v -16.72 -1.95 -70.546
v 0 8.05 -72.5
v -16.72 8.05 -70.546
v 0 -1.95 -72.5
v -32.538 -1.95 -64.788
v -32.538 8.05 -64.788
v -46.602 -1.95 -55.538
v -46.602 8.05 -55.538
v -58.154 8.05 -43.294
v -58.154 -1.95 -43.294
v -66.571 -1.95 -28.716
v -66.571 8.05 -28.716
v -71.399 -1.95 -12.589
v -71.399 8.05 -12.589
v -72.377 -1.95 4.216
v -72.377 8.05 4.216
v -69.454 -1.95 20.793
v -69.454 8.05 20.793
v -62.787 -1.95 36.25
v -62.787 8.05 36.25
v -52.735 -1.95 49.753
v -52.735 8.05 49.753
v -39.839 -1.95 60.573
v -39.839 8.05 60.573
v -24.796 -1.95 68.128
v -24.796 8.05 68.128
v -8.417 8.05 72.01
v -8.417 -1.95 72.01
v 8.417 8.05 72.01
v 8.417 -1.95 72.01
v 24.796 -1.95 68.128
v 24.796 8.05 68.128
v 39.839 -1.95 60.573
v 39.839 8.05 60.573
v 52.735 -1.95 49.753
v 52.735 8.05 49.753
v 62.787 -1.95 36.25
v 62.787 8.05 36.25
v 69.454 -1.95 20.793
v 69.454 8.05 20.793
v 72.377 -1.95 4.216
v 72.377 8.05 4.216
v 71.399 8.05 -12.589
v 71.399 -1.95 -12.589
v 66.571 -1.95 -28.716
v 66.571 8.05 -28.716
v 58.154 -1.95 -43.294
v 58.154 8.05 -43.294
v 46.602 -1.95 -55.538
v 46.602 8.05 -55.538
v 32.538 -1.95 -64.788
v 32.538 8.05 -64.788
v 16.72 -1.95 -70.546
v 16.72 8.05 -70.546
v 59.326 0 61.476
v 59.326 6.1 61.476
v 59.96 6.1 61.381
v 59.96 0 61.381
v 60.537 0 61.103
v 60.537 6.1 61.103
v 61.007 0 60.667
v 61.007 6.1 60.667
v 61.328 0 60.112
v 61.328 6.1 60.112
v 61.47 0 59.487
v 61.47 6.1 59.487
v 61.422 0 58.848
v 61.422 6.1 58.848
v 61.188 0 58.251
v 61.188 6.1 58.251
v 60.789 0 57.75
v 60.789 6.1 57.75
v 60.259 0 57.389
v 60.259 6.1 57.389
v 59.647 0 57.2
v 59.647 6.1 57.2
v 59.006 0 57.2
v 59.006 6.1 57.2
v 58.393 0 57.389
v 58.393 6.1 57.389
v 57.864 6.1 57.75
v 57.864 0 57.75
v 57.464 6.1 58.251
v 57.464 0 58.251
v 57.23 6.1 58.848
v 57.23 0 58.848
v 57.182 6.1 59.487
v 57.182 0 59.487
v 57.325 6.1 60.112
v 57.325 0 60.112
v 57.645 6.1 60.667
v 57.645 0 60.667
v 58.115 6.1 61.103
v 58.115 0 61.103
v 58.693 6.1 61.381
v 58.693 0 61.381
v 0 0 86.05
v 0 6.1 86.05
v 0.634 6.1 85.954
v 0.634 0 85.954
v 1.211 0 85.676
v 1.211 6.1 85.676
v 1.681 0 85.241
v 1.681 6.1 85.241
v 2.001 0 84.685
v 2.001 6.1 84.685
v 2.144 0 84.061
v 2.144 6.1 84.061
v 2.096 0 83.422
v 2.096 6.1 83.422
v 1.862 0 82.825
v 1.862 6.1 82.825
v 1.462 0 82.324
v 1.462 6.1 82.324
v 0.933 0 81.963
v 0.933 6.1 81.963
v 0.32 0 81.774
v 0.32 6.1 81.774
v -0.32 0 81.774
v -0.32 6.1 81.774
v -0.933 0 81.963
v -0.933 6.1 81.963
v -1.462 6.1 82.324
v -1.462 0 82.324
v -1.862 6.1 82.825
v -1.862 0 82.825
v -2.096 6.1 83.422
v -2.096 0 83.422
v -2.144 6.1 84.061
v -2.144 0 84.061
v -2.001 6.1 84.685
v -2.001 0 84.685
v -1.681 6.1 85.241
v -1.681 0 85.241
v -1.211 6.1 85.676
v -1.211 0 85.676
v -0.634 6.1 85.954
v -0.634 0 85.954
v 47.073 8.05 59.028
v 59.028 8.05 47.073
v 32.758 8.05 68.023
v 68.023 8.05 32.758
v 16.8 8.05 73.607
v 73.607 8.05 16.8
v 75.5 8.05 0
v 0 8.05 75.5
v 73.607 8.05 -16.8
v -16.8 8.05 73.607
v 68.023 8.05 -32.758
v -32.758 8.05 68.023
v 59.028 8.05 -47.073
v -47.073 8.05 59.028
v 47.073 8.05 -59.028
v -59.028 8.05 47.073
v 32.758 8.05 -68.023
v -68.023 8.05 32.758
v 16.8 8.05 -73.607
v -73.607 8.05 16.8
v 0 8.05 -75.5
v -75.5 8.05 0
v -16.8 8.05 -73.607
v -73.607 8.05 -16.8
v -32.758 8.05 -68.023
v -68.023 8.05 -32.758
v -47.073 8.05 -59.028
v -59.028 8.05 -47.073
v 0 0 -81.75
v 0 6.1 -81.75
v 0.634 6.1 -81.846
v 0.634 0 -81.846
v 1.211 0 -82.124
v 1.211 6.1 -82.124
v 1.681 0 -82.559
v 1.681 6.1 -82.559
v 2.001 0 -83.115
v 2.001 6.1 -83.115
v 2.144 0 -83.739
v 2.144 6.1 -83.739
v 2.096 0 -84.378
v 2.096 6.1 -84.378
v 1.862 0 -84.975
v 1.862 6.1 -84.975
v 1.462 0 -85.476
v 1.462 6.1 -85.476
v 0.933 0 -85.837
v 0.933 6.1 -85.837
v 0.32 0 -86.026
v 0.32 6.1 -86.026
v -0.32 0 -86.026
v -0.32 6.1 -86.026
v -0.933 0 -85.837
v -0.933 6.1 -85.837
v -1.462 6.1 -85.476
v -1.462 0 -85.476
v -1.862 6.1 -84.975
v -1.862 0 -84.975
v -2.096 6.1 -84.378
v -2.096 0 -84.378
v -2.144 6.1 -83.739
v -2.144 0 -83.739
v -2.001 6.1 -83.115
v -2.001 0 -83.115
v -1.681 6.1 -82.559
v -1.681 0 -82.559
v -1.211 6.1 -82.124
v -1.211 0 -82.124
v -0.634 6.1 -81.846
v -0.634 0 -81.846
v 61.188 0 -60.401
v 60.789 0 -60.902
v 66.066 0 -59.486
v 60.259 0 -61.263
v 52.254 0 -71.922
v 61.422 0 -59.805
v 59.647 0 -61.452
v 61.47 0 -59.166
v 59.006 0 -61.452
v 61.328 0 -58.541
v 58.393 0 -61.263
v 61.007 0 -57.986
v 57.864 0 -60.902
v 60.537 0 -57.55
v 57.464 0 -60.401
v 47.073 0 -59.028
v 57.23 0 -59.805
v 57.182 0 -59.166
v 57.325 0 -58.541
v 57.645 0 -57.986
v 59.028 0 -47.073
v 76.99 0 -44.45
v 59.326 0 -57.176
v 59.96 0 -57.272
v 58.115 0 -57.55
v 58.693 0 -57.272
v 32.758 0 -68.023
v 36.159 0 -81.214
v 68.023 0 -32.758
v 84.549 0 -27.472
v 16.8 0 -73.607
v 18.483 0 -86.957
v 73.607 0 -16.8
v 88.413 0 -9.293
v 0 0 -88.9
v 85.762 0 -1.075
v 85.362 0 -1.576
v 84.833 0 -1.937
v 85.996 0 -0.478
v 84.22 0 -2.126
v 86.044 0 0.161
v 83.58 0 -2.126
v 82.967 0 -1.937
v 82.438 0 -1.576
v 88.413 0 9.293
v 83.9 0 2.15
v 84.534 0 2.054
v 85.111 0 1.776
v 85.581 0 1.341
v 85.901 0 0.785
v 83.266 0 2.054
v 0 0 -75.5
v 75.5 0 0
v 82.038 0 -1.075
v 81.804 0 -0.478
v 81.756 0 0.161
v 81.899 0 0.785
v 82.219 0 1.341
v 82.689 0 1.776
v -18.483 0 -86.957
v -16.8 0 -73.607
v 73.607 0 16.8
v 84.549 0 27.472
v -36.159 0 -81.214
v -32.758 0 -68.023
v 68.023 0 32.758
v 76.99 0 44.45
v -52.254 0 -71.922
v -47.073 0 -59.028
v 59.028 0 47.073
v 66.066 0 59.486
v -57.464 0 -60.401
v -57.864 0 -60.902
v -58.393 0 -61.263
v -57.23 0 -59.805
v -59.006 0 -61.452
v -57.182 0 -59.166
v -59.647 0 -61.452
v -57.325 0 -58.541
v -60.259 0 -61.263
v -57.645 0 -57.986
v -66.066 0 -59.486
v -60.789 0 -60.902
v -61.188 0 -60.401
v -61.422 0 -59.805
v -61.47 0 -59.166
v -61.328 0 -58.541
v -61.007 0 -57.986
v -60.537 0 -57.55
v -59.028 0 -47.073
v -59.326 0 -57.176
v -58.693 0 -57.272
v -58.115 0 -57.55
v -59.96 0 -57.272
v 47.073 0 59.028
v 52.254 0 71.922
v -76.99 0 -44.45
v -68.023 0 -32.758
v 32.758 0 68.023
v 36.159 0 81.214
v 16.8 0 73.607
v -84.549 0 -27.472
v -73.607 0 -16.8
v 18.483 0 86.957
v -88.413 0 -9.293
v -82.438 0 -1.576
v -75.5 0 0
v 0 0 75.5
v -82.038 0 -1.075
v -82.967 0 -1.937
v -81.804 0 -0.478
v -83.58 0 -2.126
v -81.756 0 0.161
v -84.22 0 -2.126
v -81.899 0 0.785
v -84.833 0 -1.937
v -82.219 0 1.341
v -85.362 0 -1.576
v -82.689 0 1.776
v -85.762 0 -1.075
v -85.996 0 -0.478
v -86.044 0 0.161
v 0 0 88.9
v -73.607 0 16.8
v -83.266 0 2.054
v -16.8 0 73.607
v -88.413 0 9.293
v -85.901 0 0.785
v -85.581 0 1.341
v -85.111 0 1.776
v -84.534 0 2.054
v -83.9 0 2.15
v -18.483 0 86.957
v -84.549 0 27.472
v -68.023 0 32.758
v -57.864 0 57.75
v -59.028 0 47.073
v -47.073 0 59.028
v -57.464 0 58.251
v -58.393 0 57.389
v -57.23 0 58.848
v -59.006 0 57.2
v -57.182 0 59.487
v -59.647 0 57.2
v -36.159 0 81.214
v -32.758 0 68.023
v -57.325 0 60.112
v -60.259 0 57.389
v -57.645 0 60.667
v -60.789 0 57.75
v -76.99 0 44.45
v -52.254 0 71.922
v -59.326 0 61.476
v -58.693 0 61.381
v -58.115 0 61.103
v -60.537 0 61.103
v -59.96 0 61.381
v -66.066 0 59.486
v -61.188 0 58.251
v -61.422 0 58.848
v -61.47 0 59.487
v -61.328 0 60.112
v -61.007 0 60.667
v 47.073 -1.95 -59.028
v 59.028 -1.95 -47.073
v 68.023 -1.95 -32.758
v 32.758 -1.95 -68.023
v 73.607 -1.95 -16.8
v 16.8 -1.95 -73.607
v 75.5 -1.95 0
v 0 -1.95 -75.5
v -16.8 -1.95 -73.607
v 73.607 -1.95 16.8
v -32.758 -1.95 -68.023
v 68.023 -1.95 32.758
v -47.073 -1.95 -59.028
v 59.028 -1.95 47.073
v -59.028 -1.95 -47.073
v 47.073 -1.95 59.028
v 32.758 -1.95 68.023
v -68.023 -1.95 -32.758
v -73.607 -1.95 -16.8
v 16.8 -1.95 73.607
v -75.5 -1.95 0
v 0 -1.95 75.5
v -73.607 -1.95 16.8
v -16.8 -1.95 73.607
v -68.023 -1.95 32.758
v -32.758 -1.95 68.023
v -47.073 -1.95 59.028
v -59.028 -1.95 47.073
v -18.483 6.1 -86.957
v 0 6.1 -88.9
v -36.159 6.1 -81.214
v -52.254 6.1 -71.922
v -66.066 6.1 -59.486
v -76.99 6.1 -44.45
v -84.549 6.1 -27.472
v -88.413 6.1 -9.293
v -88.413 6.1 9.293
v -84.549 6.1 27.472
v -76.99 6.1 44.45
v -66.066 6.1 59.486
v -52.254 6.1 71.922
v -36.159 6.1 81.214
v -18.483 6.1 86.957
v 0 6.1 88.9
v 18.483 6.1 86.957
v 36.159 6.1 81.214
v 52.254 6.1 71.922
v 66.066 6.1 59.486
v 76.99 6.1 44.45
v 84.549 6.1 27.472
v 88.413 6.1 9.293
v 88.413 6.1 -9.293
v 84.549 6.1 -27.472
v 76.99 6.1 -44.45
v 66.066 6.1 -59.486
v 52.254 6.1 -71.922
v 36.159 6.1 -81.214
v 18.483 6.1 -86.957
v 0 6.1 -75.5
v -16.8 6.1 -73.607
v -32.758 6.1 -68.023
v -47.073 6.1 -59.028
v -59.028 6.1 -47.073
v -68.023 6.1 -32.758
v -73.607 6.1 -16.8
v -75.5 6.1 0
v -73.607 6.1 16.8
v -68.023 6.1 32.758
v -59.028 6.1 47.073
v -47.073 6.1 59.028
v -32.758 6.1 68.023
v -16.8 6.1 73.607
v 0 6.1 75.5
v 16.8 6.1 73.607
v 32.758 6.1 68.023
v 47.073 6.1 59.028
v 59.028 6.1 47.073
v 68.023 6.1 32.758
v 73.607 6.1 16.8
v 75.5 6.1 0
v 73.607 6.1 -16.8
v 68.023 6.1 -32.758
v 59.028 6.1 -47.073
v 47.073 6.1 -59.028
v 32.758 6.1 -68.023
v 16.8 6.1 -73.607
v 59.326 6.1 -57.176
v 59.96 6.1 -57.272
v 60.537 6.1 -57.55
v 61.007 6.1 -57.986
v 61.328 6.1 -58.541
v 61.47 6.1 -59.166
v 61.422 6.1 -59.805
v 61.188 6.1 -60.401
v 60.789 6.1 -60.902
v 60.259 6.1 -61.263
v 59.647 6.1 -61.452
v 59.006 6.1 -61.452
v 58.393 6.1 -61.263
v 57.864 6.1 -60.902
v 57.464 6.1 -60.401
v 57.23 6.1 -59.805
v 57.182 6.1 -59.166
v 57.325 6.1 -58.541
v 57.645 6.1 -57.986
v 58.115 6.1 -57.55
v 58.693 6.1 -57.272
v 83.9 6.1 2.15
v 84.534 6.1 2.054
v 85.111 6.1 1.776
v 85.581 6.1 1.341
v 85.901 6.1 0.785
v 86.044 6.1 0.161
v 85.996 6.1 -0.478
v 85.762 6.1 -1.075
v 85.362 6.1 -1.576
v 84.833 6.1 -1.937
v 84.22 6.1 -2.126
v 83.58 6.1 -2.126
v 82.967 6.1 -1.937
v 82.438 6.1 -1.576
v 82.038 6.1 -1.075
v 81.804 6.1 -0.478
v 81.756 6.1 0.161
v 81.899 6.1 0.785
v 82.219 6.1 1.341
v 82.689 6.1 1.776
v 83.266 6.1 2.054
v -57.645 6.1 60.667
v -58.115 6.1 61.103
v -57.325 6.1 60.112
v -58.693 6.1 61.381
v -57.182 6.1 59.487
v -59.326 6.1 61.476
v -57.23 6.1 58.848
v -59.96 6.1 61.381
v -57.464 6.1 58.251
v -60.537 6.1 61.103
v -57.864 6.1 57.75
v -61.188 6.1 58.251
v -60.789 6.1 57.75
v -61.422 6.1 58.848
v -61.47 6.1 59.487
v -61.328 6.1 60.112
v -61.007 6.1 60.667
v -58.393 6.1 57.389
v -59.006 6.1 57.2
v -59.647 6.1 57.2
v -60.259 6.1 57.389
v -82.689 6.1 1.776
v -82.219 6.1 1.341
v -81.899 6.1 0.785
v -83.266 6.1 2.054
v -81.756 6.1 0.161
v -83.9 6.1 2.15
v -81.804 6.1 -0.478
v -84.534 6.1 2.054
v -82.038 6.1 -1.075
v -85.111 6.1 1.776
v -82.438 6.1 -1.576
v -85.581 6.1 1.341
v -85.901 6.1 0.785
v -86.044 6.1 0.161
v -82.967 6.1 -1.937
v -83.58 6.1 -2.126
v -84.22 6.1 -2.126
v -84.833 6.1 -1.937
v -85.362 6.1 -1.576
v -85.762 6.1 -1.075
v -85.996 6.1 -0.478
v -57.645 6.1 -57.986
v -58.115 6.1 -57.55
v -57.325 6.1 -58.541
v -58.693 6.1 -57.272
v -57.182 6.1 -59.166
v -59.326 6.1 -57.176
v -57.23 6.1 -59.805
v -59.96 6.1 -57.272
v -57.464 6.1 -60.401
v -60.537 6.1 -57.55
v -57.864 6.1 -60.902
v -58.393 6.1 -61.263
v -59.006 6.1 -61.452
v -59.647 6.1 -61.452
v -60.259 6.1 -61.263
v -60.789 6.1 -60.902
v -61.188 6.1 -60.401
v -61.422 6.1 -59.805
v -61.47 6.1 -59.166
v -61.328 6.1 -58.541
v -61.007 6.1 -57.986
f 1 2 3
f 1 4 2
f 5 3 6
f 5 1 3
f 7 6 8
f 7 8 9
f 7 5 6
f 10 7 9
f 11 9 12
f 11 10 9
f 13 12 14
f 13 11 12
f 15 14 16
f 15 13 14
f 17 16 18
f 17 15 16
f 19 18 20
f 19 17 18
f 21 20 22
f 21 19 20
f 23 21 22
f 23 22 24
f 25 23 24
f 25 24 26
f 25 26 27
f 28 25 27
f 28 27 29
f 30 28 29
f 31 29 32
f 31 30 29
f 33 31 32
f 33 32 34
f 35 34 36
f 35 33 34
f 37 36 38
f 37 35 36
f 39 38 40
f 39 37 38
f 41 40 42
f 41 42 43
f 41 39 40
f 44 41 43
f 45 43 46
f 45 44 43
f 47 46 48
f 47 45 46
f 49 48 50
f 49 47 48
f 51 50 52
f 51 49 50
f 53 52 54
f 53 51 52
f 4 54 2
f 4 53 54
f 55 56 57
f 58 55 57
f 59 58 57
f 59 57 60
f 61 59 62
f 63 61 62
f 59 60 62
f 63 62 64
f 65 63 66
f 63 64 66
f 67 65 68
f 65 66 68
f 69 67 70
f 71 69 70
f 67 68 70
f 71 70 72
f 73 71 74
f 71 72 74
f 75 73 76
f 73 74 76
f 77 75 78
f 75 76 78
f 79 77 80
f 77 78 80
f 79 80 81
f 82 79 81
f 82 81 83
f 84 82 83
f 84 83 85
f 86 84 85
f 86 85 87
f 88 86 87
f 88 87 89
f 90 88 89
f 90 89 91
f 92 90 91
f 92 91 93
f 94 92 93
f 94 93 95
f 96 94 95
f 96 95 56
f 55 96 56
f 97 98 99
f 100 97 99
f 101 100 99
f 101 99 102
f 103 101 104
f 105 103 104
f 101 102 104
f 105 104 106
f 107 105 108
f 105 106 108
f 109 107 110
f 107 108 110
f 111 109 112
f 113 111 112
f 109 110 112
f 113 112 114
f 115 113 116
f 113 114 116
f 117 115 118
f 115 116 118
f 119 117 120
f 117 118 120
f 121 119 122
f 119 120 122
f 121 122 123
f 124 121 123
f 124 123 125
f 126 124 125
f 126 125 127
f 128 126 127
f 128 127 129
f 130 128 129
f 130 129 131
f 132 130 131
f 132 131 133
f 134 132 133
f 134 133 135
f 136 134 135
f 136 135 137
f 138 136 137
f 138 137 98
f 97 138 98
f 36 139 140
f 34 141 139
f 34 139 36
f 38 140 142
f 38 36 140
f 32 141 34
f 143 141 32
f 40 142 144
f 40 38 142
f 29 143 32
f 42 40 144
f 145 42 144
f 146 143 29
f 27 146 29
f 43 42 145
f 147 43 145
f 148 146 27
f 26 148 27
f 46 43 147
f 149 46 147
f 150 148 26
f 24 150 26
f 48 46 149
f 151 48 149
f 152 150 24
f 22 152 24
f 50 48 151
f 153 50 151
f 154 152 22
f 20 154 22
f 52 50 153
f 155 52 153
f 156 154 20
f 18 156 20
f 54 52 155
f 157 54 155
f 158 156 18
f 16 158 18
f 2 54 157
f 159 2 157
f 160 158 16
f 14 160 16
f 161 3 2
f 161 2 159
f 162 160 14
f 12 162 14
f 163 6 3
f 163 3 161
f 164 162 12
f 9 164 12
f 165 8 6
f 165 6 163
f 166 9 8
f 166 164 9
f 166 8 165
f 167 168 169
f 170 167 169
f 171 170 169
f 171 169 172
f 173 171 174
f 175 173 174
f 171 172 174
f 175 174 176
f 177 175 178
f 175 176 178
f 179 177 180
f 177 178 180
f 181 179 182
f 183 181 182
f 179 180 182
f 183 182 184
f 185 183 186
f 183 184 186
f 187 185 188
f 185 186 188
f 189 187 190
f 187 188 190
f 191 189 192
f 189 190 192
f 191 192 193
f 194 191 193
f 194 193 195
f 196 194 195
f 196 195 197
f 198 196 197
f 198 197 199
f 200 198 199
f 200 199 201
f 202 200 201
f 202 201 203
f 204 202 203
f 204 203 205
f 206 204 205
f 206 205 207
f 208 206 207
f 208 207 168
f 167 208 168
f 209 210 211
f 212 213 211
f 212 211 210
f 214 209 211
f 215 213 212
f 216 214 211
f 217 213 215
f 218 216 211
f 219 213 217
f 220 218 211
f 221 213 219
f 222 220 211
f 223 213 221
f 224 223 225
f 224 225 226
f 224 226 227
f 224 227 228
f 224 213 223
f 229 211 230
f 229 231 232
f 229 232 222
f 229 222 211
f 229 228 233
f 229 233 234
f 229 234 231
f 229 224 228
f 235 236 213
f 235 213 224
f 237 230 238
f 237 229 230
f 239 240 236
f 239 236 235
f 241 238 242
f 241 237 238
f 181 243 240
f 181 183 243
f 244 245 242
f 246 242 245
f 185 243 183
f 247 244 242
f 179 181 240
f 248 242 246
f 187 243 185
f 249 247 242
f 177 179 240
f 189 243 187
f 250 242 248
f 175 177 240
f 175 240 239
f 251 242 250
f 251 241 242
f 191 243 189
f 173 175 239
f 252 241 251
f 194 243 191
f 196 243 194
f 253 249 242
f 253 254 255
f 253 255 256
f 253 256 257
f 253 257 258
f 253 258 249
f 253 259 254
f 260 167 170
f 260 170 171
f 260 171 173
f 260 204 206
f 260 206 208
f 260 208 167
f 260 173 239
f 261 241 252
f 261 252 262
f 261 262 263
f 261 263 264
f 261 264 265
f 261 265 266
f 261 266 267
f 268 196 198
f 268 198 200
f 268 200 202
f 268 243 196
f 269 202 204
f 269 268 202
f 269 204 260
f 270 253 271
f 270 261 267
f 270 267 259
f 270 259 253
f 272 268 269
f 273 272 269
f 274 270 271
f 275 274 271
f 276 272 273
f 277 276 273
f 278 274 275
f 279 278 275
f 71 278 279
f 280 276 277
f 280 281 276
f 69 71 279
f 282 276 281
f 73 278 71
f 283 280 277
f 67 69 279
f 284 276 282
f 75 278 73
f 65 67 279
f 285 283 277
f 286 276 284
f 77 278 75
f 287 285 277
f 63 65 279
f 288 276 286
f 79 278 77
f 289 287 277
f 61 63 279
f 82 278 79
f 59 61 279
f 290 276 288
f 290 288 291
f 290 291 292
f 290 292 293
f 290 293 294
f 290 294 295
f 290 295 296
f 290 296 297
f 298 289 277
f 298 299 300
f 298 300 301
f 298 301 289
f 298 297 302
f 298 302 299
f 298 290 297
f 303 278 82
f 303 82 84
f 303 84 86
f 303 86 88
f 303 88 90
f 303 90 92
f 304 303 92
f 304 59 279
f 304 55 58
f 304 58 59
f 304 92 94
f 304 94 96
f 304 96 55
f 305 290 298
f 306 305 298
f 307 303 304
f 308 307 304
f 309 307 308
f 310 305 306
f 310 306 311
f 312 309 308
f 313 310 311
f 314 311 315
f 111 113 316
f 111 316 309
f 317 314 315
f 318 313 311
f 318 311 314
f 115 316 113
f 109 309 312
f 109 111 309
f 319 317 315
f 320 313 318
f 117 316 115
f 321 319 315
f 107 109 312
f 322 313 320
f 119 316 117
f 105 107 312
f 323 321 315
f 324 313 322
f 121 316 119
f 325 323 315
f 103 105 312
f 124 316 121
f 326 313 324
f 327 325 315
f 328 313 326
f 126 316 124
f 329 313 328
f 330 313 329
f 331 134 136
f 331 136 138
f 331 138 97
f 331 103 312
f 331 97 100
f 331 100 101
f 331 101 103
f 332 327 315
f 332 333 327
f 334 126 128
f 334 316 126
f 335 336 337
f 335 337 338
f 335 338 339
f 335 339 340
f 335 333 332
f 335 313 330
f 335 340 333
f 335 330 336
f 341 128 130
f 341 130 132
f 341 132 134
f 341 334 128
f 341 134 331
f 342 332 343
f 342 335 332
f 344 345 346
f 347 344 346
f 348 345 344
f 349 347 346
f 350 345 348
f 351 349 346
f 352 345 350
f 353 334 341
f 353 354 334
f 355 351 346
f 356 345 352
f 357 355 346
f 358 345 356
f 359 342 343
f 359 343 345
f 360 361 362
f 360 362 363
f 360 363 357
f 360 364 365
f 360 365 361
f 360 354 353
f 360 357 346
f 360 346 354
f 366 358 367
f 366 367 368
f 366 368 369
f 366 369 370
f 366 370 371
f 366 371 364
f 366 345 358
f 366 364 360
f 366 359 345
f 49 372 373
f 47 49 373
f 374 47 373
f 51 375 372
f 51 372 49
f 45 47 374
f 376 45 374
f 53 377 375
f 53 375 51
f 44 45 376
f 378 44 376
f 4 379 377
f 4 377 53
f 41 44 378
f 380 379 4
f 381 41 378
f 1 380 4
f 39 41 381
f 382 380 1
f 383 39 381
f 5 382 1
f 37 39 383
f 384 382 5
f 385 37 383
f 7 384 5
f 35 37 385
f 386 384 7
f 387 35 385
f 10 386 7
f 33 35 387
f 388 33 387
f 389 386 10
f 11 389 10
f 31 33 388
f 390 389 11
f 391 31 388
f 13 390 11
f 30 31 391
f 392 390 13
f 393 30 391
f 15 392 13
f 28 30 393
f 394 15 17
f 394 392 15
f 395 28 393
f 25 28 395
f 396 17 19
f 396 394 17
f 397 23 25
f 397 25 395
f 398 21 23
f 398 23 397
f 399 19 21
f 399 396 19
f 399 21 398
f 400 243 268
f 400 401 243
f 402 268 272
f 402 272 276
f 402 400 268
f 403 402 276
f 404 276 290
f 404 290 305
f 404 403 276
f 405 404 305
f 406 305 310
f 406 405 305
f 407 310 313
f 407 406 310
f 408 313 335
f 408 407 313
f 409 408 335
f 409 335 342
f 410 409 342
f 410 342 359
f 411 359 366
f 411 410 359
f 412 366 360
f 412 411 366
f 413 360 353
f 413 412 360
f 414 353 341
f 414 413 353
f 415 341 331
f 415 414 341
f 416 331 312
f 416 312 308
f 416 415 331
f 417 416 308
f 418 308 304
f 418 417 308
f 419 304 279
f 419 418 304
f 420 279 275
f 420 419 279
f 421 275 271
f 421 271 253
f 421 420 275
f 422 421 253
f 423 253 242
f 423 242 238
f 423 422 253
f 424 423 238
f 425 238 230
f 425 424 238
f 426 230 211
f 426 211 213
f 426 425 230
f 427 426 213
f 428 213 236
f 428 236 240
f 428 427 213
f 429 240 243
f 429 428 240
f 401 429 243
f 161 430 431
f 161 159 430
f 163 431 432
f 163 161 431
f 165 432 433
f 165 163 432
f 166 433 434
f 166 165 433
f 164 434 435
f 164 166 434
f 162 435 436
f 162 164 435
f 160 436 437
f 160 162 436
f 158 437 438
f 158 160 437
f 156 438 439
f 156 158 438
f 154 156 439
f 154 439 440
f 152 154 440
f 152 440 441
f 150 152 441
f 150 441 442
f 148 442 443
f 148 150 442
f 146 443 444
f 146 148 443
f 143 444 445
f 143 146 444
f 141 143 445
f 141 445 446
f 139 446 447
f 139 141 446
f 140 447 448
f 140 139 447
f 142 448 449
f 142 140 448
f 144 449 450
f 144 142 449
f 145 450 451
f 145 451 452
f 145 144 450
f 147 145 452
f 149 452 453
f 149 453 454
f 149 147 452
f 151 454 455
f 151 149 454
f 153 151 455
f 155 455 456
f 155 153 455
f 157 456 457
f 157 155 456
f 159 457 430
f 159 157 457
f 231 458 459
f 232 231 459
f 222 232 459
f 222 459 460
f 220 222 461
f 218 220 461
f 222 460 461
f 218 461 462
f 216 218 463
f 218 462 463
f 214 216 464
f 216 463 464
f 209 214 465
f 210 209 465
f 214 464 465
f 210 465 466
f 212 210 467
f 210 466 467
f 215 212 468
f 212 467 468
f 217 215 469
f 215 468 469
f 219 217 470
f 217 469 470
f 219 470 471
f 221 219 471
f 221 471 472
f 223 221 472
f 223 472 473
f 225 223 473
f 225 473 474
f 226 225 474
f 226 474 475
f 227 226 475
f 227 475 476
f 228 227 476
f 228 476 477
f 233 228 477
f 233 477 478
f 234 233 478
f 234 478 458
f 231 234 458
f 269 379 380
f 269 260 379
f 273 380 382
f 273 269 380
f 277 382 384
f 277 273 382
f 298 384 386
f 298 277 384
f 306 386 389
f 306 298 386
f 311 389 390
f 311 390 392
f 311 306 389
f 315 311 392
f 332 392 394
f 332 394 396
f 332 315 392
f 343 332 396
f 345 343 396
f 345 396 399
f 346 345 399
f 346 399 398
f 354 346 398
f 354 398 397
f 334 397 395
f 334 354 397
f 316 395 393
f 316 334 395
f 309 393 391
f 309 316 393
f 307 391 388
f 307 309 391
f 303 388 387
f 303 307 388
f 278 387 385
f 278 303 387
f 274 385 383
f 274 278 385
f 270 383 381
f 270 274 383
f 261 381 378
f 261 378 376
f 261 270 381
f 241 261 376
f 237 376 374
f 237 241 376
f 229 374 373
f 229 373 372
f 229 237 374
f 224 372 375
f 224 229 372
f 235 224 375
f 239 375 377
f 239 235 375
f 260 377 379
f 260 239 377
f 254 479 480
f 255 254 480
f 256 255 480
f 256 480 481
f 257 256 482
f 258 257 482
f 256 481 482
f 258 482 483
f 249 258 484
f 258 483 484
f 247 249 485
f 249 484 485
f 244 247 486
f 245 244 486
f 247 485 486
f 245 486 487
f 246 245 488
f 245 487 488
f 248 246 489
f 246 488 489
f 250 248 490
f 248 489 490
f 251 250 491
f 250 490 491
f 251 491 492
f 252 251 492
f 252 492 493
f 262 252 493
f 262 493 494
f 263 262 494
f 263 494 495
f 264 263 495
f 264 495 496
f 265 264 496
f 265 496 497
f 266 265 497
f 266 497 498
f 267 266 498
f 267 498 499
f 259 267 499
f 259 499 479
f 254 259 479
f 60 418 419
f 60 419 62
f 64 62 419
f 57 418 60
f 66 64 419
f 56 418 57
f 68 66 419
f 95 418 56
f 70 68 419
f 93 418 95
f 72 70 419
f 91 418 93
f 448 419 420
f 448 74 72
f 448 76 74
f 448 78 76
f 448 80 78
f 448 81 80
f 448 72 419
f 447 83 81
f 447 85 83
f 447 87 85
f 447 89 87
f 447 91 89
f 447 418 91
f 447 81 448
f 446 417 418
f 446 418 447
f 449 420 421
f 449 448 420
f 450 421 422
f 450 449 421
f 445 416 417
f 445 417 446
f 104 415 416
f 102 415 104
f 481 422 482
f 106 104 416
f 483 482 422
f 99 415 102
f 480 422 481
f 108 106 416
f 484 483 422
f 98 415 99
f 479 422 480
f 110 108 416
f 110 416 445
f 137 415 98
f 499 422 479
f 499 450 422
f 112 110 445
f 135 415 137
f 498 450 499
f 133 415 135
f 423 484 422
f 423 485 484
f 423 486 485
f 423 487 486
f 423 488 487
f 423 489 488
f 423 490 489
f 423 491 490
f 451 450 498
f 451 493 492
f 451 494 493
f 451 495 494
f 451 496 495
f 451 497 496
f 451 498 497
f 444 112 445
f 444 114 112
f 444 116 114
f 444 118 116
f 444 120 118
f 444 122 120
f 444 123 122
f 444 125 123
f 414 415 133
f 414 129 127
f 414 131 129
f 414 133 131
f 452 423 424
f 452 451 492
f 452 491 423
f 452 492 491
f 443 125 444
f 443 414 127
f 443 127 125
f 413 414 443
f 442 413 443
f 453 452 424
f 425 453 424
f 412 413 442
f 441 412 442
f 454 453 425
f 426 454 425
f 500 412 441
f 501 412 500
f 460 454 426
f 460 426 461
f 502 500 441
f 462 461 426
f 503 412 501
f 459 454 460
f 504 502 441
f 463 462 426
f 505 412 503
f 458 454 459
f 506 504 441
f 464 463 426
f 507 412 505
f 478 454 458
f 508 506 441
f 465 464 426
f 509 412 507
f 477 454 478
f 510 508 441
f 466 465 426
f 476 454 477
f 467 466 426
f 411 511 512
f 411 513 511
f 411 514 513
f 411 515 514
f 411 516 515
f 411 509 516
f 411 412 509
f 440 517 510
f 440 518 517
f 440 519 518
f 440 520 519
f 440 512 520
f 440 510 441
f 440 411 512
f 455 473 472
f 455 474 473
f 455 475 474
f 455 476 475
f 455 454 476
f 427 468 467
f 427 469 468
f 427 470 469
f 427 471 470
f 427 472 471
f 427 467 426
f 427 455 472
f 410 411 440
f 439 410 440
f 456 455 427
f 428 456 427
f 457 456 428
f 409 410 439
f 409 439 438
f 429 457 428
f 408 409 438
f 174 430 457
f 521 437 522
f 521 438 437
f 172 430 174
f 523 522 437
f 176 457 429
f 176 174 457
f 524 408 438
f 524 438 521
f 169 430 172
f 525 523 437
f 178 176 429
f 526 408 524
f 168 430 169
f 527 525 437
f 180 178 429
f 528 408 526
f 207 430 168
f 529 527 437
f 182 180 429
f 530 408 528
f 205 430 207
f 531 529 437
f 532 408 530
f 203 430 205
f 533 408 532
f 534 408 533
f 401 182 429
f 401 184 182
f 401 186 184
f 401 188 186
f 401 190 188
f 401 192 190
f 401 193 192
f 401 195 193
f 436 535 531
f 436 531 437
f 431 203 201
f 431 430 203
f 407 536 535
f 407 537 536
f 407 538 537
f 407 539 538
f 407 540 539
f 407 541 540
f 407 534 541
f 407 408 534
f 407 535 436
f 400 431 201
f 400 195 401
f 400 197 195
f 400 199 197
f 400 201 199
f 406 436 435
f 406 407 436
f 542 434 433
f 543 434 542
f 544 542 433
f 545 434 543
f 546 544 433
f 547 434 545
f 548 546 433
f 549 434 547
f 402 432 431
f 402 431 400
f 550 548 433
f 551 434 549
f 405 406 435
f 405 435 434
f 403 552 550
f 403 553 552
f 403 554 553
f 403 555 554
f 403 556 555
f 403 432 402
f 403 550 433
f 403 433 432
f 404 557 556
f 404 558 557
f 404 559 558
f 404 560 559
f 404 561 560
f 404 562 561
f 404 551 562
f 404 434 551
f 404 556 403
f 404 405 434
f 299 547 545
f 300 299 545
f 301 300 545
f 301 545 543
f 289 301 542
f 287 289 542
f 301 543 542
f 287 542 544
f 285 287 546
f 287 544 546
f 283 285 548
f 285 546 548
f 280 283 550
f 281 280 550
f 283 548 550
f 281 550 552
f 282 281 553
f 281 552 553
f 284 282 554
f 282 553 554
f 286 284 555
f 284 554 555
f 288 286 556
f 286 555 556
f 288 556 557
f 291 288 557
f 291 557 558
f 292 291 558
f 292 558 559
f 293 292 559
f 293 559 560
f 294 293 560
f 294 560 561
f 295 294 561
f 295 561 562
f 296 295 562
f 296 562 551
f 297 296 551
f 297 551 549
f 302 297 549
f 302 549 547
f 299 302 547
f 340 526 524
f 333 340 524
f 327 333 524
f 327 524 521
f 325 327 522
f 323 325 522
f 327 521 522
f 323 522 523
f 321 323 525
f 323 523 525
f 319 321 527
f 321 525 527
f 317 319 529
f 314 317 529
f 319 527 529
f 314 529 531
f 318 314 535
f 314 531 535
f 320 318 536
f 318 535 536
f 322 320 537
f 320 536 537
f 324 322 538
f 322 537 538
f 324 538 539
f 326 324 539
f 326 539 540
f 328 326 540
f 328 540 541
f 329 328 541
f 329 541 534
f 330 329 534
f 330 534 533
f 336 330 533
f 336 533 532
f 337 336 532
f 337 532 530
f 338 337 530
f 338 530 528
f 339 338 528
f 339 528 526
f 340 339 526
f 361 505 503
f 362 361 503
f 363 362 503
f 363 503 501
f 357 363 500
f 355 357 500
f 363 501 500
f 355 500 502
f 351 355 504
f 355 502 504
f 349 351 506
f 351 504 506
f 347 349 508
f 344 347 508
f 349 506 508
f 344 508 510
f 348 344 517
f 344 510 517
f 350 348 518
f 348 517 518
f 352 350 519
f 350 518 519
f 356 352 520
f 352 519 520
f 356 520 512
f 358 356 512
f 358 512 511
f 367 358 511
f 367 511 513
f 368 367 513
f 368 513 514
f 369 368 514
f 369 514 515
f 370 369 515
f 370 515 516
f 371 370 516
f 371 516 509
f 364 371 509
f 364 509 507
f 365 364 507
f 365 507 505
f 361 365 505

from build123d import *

# Parameters (mm, degrees)
SKETCH_2_R          = 2.15
CUT_EXTRUDE_1_DEPTH = 10


with BuildPart() as part:
    # 草图1 → 旋转1 (revolve)
    with BuildSketch(Plane.XY, mode=Mode.PRIVATE) as revolve_1_sk:
        Polygon((75.5, 0), (88.9, 0), (88.9, 6.1), (75.5, 6.1), (75.5, 8.05), (72.5, 8.05), (72.5, -1.95), (75.5, -1.95), align=None)
    revolve(revolve_1_sk.sketch.rotate(Axis((0, 0, 0), (0, 1, 0)), 90), axis=Axis((0, 0, 0), (0, 1, 0)))

    # 草图2 → 切除-拉伸1 (cut)
    with BuildSketch(Plane(origin=(0, 6.1, 0), x_dir=(1, 0, 0), z_dir=(0, 1, 0))):
        with Locations(Location((-83.9, 0, 0), (0, 0, 270))):
            Circle(SKETCH_2_R)
        with Locations(Location((-59.326258942, 59.326258942, 0), (0, 0, 270))):
            Circle(SKETCH_2_R)
        with Locations(Location((0, 83.9, 0), (0, 0, 270))):
            Circle(SKETCH_2_R)
        with Locations(Location((59.326258942, 59.326258942, 0), (0, 0, 270))):
            Circle(SKETCH_2_R)
        with Locations(Location((83.9, 0, 0), (0, 0, 270))):
            Circle(SKETCH_2_R)
        with Locations(Location((59.326258942, -59.326258942, 0), (0, 0, 270))):
            Circle(SKETCH_2_R)
        with Locations(Location((0, -83.9, 0), (0, 0, 270))):
            Circle(SKETCH_2_R)
        with Locations(Location((-59.326258942, -59.326258942, 0), (0, 0, 270))):
            Circle(SKETCH_2_R)
    extrude(amount=-CUT_EXTRUDE_1_DEPTH, mode=Mode.SUBTRACT)


solid = part.part
